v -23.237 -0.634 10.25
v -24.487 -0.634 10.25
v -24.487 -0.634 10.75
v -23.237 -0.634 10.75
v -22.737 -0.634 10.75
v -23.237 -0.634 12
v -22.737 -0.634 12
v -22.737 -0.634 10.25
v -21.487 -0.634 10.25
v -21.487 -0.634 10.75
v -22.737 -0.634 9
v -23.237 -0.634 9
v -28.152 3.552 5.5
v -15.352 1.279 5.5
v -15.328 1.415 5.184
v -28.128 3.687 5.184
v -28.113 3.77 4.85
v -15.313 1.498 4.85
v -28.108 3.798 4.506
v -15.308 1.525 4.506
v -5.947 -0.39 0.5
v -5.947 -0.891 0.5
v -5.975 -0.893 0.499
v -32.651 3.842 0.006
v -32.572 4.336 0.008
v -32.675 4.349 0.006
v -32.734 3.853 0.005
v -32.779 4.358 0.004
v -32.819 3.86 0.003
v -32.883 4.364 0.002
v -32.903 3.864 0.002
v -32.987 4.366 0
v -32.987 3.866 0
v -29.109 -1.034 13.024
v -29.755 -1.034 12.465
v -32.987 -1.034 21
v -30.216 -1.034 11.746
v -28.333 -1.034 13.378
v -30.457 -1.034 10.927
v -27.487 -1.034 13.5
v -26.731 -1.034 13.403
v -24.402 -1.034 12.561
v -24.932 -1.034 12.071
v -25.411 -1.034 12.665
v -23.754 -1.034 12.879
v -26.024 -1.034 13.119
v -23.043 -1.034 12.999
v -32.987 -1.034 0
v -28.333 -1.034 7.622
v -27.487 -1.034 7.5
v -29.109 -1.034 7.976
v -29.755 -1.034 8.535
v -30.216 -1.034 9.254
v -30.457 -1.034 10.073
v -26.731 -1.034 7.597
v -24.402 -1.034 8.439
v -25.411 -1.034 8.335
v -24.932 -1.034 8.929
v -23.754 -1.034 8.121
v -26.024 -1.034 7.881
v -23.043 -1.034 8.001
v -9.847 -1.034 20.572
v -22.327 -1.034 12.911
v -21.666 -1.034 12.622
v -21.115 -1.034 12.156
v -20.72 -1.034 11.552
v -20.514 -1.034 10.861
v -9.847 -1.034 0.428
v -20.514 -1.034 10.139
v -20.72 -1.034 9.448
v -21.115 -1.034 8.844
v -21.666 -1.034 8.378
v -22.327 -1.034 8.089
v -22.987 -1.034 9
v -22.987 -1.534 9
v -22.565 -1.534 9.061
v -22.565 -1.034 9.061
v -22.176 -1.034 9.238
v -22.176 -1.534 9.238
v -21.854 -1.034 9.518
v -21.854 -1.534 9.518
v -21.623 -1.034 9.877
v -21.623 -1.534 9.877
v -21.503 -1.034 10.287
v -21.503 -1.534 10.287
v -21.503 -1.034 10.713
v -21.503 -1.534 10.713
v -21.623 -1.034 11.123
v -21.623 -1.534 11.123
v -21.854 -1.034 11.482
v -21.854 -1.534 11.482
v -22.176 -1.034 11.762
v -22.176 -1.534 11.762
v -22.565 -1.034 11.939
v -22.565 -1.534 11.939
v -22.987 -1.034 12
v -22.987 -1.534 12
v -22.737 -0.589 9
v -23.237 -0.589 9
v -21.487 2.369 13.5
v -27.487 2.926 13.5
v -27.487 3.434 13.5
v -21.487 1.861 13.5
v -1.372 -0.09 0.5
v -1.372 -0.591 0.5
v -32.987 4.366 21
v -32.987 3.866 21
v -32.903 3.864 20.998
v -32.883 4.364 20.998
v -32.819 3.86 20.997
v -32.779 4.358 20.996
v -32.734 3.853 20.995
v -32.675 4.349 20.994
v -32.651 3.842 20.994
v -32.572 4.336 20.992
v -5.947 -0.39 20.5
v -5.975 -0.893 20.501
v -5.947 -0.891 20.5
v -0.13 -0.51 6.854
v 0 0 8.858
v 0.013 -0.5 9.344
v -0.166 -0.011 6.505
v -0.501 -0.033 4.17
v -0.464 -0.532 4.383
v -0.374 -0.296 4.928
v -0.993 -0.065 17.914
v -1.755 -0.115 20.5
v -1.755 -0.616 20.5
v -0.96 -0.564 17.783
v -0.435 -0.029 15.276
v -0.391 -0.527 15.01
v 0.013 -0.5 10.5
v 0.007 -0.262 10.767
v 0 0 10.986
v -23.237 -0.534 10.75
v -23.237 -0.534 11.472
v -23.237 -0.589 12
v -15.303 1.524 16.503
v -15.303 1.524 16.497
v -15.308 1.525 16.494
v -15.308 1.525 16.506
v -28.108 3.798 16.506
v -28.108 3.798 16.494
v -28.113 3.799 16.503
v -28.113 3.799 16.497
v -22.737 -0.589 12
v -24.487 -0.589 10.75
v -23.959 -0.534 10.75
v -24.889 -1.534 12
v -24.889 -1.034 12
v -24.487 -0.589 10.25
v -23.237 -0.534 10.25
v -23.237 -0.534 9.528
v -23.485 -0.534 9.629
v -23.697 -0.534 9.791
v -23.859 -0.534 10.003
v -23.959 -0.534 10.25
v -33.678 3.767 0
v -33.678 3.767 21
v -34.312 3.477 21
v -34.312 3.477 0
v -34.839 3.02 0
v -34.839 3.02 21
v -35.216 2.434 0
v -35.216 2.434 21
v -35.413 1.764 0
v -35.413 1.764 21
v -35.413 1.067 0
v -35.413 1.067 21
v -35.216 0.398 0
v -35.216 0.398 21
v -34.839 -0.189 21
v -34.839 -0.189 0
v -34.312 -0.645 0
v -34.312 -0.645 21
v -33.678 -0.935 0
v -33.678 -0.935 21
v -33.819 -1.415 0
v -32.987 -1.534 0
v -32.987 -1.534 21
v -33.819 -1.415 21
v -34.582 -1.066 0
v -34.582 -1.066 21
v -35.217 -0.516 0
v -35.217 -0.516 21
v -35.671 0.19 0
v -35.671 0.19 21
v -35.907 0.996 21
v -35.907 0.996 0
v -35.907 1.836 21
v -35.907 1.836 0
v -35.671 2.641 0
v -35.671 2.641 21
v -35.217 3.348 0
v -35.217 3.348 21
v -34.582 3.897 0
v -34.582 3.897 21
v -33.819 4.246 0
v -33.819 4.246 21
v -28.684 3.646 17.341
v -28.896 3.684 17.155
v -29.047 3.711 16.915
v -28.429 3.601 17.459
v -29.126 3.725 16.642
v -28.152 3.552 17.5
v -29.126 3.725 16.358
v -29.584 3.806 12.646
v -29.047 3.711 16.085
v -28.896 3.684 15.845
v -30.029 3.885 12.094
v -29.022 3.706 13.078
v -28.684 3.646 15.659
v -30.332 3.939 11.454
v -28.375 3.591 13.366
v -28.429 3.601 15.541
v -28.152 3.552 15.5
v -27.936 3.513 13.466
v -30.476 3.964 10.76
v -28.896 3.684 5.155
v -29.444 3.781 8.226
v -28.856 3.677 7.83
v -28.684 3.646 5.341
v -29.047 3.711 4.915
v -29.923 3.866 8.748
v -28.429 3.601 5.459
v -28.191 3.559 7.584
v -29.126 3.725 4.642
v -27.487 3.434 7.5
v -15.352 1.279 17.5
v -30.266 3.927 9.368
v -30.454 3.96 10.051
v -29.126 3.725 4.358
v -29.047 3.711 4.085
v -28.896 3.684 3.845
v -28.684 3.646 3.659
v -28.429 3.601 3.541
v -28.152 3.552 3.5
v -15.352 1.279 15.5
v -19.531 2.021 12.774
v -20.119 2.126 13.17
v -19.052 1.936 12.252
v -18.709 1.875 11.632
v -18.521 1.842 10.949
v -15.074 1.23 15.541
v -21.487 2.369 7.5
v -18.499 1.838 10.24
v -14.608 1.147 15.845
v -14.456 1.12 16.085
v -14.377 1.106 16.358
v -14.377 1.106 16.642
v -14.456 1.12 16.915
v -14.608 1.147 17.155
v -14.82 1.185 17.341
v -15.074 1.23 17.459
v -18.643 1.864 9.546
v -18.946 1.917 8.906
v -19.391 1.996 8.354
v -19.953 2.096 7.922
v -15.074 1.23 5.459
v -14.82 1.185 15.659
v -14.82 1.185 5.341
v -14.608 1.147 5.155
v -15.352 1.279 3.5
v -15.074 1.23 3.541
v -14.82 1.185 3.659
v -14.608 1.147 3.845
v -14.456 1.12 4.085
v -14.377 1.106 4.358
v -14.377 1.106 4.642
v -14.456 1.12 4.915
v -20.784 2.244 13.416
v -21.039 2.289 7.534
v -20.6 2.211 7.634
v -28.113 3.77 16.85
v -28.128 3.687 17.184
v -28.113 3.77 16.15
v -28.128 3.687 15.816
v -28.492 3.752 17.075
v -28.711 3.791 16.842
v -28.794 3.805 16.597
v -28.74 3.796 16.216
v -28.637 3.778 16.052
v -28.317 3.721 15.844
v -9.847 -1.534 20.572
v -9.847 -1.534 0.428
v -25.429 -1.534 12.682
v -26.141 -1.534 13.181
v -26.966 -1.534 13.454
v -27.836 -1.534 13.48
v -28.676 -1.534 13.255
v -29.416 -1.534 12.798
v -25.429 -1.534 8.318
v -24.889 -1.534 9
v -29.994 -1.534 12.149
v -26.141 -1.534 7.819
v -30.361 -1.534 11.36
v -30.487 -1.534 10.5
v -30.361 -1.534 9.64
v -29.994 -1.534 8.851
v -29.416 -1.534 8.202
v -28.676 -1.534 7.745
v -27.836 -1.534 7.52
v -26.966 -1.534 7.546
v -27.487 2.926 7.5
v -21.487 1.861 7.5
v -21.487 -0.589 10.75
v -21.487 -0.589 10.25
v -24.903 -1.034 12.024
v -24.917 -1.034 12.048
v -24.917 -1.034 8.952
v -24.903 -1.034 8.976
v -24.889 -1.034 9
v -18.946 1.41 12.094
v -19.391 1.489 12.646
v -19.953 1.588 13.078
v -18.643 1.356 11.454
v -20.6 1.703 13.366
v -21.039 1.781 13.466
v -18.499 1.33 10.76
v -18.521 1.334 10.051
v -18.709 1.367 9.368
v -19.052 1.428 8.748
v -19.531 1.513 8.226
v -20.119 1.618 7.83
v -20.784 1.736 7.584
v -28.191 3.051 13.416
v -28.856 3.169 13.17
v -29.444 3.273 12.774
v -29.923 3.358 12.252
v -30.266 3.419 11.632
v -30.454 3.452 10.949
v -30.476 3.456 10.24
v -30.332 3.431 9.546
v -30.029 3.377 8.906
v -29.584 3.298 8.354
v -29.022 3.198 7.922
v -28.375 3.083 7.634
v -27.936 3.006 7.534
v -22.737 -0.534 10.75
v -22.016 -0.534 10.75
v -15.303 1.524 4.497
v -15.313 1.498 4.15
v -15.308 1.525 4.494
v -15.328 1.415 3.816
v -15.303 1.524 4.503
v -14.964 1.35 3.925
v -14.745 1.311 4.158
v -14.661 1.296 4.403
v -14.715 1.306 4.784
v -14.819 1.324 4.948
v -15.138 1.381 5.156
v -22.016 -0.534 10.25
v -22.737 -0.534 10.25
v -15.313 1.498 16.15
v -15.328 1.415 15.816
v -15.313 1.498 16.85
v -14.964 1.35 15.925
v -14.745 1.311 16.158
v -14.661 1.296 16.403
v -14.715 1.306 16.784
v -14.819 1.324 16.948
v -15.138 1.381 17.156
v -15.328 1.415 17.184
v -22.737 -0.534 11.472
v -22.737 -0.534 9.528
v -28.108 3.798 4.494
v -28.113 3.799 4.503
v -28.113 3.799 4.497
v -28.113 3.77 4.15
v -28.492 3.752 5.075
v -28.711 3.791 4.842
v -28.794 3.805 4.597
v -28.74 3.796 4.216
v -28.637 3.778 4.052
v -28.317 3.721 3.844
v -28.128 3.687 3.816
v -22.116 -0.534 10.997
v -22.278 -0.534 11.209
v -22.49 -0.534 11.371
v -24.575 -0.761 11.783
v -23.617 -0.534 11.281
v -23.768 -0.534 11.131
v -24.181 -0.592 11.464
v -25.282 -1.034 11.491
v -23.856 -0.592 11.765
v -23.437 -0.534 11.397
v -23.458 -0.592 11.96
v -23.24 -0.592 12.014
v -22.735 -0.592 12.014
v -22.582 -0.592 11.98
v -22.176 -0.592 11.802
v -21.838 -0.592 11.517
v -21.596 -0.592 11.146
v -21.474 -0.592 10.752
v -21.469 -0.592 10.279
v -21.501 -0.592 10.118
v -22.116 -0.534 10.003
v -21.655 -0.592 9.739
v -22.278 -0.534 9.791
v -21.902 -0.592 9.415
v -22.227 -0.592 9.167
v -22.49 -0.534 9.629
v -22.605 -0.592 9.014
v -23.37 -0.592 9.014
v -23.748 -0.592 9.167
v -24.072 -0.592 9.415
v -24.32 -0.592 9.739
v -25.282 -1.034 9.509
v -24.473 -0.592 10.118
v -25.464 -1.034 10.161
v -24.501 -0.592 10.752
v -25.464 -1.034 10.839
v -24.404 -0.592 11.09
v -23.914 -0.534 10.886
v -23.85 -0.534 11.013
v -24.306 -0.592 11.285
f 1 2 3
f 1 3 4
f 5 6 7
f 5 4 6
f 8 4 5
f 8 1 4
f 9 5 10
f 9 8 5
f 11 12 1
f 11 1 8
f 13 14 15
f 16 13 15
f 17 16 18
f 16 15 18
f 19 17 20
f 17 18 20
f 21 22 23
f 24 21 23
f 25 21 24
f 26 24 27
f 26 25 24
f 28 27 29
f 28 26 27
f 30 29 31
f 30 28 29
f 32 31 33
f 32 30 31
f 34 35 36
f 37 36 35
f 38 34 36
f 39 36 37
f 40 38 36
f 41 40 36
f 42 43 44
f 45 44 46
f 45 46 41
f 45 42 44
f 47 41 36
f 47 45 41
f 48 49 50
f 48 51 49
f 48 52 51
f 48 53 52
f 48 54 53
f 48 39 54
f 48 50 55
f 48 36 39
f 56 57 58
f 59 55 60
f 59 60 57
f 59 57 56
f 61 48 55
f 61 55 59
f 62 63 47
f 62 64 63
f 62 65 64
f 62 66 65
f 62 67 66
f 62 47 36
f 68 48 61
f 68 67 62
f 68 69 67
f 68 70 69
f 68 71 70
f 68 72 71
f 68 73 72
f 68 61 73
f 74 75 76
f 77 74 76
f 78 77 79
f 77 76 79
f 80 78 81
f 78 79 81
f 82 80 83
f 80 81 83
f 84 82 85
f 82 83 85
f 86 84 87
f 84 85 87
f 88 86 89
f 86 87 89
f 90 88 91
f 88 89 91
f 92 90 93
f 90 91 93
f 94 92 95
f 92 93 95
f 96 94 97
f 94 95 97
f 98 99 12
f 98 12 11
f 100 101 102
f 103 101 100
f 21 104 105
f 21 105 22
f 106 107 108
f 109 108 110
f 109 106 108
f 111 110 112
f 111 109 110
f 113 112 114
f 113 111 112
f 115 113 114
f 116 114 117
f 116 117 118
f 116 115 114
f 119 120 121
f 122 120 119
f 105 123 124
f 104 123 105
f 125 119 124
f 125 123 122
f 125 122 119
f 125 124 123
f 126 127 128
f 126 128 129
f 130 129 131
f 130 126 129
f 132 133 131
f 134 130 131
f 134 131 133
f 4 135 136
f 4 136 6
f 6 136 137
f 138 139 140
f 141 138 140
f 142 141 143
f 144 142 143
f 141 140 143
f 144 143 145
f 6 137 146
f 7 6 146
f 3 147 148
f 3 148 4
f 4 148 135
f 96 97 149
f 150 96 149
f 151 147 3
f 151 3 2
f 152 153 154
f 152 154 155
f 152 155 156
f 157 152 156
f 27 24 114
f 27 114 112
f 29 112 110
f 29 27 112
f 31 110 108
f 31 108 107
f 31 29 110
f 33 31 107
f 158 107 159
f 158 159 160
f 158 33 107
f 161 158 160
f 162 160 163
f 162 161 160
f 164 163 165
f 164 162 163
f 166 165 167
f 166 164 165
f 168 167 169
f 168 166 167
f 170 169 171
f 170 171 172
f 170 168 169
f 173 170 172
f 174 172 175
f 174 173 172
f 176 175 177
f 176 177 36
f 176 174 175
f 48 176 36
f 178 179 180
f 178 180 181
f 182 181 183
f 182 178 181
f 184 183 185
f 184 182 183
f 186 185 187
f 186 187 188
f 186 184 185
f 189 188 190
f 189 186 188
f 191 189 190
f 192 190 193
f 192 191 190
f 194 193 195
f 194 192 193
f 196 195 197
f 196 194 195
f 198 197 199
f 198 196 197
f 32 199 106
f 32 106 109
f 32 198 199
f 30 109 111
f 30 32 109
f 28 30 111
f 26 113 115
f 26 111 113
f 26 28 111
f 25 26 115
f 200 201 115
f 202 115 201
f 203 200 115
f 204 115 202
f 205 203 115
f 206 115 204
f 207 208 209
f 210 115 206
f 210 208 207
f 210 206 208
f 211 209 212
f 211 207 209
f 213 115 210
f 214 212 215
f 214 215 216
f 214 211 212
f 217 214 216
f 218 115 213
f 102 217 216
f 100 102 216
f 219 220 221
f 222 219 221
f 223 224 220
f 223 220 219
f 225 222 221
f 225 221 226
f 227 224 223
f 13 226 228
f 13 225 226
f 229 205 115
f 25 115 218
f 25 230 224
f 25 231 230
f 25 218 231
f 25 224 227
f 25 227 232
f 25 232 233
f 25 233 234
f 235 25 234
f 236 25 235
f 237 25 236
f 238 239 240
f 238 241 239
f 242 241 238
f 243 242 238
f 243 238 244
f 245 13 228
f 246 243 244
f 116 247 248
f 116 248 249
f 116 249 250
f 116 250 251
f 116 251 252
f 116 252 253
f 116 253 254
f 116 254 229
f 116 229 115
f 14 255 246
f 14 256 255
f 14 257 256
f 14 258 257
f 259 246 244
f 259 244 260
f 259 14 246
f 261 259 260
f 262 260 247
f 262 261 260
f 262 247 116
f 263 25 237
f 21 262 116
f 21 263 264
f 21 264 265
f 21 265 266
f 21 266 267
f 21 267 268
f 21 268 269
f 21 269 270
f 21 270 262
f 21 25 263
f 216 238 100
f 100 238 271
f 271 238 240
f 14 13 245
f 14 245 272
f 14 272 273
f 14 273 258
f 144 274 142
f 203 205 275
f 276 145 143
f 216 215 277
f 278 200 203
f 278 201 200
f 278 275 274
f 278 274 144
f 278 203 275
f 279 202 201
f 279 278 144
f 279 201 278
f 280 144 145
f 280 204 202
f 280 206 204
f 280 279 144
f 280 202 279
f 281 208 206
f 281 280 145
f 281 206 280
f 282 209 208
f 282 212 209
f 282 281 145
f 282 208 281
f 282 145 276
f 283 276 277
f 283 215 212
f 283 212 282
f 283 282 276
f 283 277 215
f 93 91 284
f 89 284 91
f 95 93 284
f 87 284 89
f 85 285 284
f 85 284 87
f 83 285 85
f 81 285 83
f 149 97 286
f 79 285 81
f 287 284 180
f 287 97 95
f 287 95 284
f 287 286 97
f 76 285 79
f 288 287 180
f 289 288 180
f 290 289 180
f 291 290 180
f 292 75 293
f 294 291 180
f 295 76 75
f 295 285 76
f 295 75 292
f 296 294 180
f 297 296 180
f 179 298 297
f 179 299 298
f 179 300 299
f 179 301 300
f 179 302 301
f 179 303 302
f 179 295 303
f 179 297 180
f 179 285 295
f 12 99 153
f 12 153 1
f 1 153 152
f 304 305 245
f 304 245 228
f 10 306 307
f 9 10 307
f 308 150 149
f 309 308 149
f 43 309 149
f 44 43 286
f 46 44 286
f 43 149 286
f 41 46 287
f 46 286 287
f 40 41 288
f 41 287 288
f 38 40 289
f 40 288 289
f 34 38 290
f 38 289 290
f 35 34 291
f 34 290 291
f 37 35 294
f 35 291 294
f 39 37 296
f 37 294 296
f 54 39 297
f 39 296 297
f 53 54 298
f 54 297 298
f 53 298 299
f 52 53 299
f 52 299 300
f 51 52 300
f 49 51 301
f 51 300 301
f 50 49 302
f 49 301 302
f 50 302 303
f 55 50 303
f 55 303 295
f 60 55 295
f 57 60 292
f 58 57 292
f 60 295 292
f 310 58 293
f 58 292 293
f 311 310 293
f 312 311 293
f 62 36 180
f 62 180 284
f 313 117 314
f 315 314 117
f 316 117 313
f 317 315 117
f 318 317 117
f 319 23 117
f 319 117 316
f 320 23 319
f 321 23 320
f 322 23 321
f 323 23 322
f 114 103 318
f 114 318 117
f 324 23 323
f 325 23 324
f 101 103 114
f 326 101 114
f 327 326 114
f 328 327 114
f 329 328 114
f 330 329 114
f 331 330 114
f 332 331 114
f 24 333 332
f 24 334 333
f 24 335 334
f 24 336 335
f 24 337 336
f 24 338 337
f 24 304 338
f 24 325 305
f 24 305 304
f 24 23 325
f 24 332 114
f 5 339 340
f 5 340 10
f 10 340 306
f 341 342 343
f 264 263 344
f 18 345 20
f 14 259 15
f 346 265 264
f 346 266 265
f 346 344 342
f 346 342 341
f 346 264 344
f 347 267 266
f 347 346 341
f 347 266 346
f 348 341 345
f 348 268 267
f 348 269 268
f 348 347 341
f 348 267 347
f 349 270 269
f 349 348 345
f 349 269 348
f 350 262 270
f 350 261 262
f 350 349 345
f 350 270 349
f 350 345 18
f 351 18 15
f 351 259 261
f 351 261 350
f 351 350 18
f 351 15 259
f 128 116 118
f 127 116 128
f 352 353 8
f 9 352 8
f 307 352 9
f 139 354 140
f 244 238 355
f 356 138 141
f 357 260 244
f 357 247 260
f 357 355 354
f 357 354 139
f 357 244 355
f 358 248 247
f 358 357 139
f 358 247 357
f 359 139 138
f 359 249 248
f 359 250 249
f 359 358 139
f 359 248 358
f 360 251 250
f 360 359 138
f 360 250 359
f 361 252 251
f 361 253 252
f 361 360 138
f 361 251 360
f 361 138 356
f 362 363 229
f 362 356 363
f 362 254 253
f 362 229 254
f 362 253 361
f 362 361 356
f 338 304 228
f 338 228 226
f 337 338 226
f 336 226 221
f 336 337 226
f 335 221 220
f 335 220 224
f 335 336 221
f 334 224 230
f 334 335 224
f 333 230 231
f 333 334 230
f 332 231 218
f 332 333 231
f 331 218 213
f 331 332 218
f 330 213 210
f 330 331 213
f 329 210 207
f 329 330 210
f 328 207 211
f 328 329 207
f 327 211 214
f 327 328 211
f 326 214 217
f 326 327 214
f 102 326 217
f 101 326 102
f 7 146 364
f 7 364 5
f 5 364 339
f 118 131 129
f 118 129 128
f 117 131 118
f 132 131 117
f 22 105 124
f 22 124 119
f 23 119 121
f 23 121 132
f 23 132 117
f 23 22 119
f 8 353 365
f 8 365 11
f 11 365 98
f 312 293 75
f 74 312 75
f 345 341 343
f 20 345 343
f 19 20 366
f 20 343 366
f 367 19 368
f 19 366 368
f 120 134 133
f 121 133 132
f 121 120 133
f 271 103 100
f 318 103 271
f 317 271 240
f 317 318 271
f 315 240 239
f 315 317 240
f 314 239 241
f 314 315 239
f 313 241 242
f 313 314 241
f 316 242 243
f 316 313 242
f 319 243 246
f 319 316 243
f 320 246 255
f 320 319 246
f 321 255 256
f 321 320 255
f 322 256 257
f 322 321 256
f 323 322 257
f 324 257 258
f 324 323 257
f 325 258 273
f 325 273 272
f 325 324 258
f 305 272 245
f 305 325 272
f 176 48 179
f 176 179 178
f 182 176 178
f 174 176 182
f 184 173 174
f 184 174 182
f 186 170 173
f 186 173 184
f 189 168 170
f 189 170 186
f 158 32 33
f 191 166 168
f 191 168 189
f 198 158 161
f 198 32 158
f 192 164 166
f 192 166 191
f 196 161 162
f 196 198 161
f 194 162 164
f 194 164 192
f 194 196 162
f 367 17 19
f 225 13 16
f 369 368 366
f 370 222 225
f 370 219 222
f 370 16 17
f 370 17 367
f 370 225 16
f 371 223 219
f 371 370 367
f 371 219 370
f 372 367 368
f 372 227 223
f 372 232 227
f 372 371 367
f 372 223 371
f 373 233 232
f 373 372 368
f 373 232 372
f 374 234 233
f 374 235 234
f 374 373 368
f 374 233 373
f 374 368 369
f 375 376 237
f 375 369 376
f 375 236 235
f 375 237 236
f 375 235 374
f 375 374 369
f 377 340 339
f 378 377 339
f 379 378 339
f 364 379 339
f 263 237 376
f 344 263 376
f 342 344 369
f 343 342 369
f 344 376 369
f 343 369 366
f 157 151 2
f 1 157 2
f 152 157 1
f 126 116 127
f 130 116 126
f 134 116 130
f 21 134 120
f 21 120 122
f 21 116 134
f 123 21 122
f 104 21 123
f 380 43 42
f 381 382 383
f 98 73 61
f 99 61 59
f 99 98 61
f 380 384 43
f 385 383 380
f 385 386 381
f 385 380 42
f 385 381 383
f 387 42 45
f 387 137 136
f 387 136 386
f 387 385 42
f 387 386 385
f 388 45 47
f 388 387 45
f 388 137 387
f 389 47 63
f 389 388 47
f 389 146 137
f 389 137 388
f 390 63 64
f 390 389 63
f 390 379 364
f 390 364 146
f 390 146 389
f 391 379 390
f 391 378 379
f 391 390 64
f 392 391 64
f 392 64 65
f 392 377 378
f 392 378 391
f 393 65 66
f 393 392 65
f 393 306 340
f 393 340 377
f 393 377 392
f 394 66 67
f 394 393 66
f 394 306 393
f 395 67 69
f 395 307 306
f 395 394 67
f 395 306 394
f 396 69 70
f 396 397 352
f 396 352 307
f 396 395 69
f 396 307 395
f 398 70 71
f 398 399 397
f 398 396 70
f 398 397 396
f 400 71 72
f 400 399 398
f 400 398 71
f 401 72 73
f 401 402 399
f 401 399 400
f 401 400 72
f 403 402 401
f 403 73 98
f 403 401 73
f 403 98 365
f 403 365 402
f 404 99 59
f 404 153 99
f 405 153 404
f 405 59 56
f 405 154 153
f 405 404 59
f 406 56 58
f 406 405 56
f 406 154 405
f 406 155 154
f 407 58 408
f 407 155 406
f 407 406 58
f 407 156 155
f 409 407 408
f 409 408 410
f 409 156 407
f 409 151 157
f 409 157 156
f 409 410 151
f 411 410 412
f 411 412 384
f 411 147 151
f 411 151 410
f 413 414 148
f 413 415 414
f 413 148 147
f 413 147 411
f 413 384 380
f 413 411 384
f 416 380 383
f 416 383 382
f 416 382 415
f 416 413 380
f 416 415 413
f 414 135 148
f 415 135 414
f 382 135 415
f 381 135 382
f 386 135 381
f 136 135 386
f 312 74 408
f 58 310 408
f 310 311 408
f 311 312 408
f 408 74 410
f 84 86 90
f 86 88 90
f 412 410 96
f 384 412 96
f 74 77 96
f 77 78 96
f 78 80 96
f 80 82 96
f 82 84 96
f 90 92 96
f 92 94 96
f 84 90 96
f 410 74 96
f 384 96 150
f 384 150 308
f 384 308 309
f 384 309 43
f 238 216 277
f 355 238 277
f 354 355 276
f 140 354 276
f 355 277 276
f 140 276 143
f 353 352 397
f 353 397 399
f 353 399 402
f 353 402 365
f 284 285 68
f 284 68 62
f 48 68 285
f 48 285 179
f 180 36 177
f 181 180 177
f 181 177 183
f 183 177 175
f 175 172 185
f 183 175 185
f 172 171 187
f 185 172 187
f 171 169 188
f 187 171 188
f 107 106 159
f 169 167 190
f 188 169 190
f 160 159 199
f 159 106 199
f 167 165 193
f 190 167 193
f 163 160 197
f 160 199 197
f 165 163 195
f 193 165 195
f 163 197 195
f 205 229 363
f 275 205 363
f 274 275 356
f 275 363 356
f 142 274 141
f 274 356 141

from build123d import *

# Parameters (mm, degrees)
BOSS_EXTRUDE1_DEPTH = 21
CUT_EXTRUDE1_START  = -5.9
CUT_EXTRUDE1_DEPTH  = 5.9
SKETCH3_W           = 10
SKETCH3_H           = 23.477945608
CUT_EXTRUDE2_DEPTH  = 0.5
CUT_EXTRUDE3_DEPTH  = 0.5
CUT_EXTRUDE4_DEPTH  = 11.5
BOSS_EXTRUDE2_DEPTH = 0.25
FILLET1_R           = 2.1
SKETCH7_R           = 2.5
BOSS_EXTRUDE3_DEPTH = 0.5
SKETCH8_W           = 0.5
SKETCH8_H           = 1.25
SKETCH8_H_2         = 0.5
SKETCH8_W_2         = 1.25
CUT_EXTRUDE5_DEPTH  = 0.1
FILLET2_R           = 2.49


# Read off the part's stored shape, not the designer's step: Cut-Extrude1
with BuildPart() as part:
    # Sketch1 → Boss-Extrude1 (new body)
    with BuildSketch(Plane.XY):
        with BuildLine():
            Line((0.012557203, -0.500251932), (-5.974554862, -0.89330298))
            Line((-5.974554862, -0.89330298), (-32.650528742, 3.842496807))
            ThreePointArc((-32.650528742, 3.842496807), (-35.431616847, 1.584631463), (-32.987442797, -1.0342271))
            Line((-32.987442797, -1.0342271), (0.012557203, -1.0342271))
            Line((0.012557203, -1.0342271), (0.012557203, -1.5342271))
            Line((0.012557203, -1.5342271), (-32.987442797, -1.5342271))
            ThreePointArc((-32.987442797, -1.5342271), (-35.930083434, 1.624018145), (-32.571991326, 4.336372166))
            Line((-32.571991326, 4.336372166), (-5.946831197, -0.390406628))
            Line((-5.946831197, -0.390406628), (0, 0))
            Line((0, 0), (0.012557203, -0.500251932))
        make_face()
    extrude(amount=BOSS_EXTRUDE1_DEPTH)

    # Cut-Extrude1 outline → Cut-Extrude1 (cut)
    with BuildSketch(Plane.XZ.offset(1.5342271).offset(CUT_EXTRUDE1_START)):
        with BuildLine():
            Line((0.012557203, 0), (0.012557203, 9.343939236))
            add(Edge.make_bspline(
                [(0.012557203, 9.343939236), (-0.067700916, 4.933400966), (-1.372327976, 0.5)],
                knots=[0.559253537, 0.559253537, 0.559253537, 1, 1, 1], degree=2))
            Line((-1.372327976, 0.5), (-5.946831197, 0.5))
            Line((-5.946831197, 0.5), (-32.987442797, 0))
            Line((-32.987442797, 0), (0.012557203, 0))
        make_face()
        with BuildLine():
            add(Edge.make_bspline(
                [(-1.755064488, 20.5), (-0.078758631, 15.514798295), (0.012557203, 10.5)],
                knots=[0, 0, 0, 0.501471147, 0.501471147, 0.501471147], degree=2))
            Line((0.012557203, 10.5), (0.012557203, 21))
            Line((0.012557203, 21), (-32.987442797, 21))
            Line((-32.987442797, 21), (-5.946831197, 20.5))
            Line((-5.946831197, 20.5), (-1.755064488, 20.5))
        make_face()
    extrude(amount=CUT_EXTRUDE1_DEPTH, mode=Mode.SUBTRACT)

    # Sketch3 → Cut-Extrude2 (cut)
    with BuildSketch(Plane.XZ.offset(1.5342271)):
        with Locations((-4.846794028, 9.392909882)):
            Rectangle(SKETCH3_W, SKETCH3_H)
    extrude(amount=-CUT_EXTRUDE2_DEPTH, mode=Mode.SUBTRACT)

    # Sketch4 → Cut-Extrude3 (cut)
    with BuildSketch(Plane.XZ.offset(1.5342271)):
        with BuildLine():
            Line((-22.987442797, 12), (-24.889366586, 12))
            ThreePointArc((-24.889366586, 12), (-30.487442797, 10.5), (-24.889366586, 9))
            Line((-24.889366586, 9), (-22.987442797, 9))
            ThreePointArc((-22.987442797, 9), (-21.487442797, 10.5), (-22.987442797, 12))
        make_face()
    extrude(amount=-CUT_EXTRUDE3_DEPTH, mode=Mode.SUBTRACT)

    # Sketch5 → Cut-Extrude4 (cut)
    with BuildSketch(Plane(origin=(0, -1.0342271, 0), x_dir=(1, 0, 0), z_dir=(0, 1, 0))):
        with BuildLine():
            Line((-27.487442797, -13.5), (-21.487442797, -13.5))
            ThreePointArc((-21.487442797, -13.5), (-18.487442797, -10.5), (-21.487442797, -7.5))
            Line((-21.487442797, -7.5), (-27.487442797, -7.5))
            ThreePointArc((-27.487442797, -7.5), (-30.487442797, -10.5), (-27.487442797, -13.5))
        make_face()
    extrude(amount=CUT_EXTRUDE4_DEPTH, mode=Mode.SUBTRACT)

    # Sketch6 → Boss-Extrude2 (add)
    with BuildSketch(Plane(origin=(-0.248891567, -1.401964872, 0), x_dir=(0.9846044320073983, -0.1747973468659884, 0), z_dir=(0.17479734686598838, 0.9846044320073982, 0))):
        with BuildLine():
            Line((-28.339083857, -3.5), (-15.339083857, -3.5))
            ThreePointArc((-15.339083857, -3.5), (-14.339083857, -4.5), (-15.339083857, -5.5))
            Line((-15.339083857, -5.5), (-28.339083857, -5.5))
            ThreePointArc((-28.339083857, -5.5), (-29.339083857, -4.5), (-28.339083857, -3.5))
        make_face()
        with BuildLine():
            Line((-28.339083857, -15.5), (-15.339083857, -15.5))
            ThreePointArc((-15.339083857, -15.5), (-14.339083857, -16.5), (-15.339083857, -17.5))
            Line((-15.339083857, -17.5), (-28.339083857, -17.5))
            ThreePointArc((-28.339083857, -17.5), (-29.339083857, -16.5), (-28.339083857, -15.5))
        make_face()
    extrude(amount=BOSS_EXTRUDE2_DEPTH)

    # Fillet1
    # the kernel refuses this fillet: 2.1 mm, written as the material it takes off along each edge
    with BuildSketch(Plane(origin=(-28.107979795, 3.797782907, 3.5), x_dir=(-0.1747973468659884, -0.9846044320073982, 0), z_dir=(0.9846044320073983, -0.1747973468659884, 0)), Plane(origin=(-15.308122178, 1.525417398, 5.5), x_dir=(-0.17479734686598844, -0.9846044320073983, 0), z_dir=(-0.9846044320073983, 0.1747973468659884, 0)), Plane(origin=(-28.107979795, 3.797782907, 15.5), x_dir=(-0.1747973468659884, -0.9846044320073983, 0), z_dir=(0.9846044320073983, -0.1747973468659884, 0)), Plane(origin=(-15.308122178, 1.525417398, 17.5), x_dir=(-0.17479734686598838, -0.9846044320073983, 0), z_dir=(-0.9846044320073983, 0.1747973468659884, 0))) as fillet1_piece_1:
        with BuildLine():
            CenterArc((2.1, -0.993730346), FILLET1_R, 151.757462816, 28.242537184)
            Line((0, -0.993730346), (-0.042, -0.993730346))
            Line((-0.042, -0.993730346), (-0.042, 0))
            Line((-0.042, 0), (0, 0.042))
            ThreePointArc((0, 0.042), (0.125, 0.042), (0.213, 0.019874607))
            Line((0.213, 0.019874607), (0.25, 0))
        make_face()
    extrude(amount=13, mode=Mode.SUBTRACT)
    with BuildSketch(Plane(origin=(-15.308122178, 1.525417398, 16.5), x_dir=(0, 0, -1), z_dir=(-0.9846044320073983, 0.1747973468659884, 0))) as fillet1_piece_2:
        with BuildLine():
            CenterArc((0.006269654, 2.1), FILLET1_R, 270, 28.242537184)
            Line((0.006269654, 0), (0.006269654, -0.042))
            Line((0.006269654, -0.042), (1, -0.042))
            Line((1, -0.042), (1.042, 0))
            ThreePointArc((1.042, 0), (1.042, 0.125), (1.019874607, 0.213))
            Line((1.019874607, 0.213), (1, 0.25))
        make_face()
    revolve(axis=Axis((-15.308122178, 1.525417398, 16.5), (-0.1747973468659884, -0.9846044320073983, 0)), revolution_arc=180, mode=Mode.SUBTRACT)
    with BuildSketch(Plane(origin=(-28.107979795, 3.797782907, 16.5), x_dir=(0, 0, 1), z_dir=(0.9846044320073983, -0.1747973468659884, 0))) as fillet1_piece_3:
        with BuildLine():
            CenterArc((0.006269654, 2.1), FILLET1_R, 270, 28.242537184)
            Line((0.006269654, 0), (0.006269654, -0.042))
            Line((0.006269654, -0.042), (1, -0.042))
            Line((1, -0.042), (1.042, 0))
            ThreePointArc((1.042, 0), (1.042, 0.125), (1.019874607, 0.213))
            Line((1.019874607, 0.213), (1, 0.25))
        make_face()
    revolve(axis=Axis((-28.107979795, 3.797782907, 16.5), (-0.1747973468659884, -0.9846044320073983, 0)), revolution_arc=180, mode=Mode.SUBTRACT)
    with BuildSketch(Plane(origin=(-15.308122178, 1.525417398, 4.5), x_dir=(0, 0, -1), z_dir=(-0.9846044320073983, 0.1747973468659884, 0))) as fillet1_piece_4:
        with BuildLine():
            CenterArc((0.006269654, 2.1), FILLET1_R, 270, 28.242537184)
            Line((0.006269654, 0), (0.006269654, -0.042))
            Line((0.006269654, -0.042), (1, -0.042))
            Line((1, -0.042), (1.042, 0))
            ThreePointArc((1.042, 0), (1.042, 0.125), (1.019874607, 0.213))
            Line((1.019874607, 0.213), (1, 0.25))
        make_face()
    revolve(axis=Axis((-15.308122178, 1.525417398, 4.5), (-0.1747973468659884, -0.9846044320073983, 0)), revolution_arc=180, mode=Mode.SUBTRACT)
    with BuildSketch(Plane(origin=(-28.107979795, 3.797782907, 4.5), x_dir=(0, 0, 1), z_dir=(0.9846044320073983, -0.1747973468659884, 0))) as fillet1_piece_5:
        with BuildLine():
            CenterArc((0.006269654, 2.1), FILLET1_R, 270, 28.242537184)
            Line((0.006269654, 0), (0.006269654, -0.042))
            Line((0.006269654, -0.042), (1, -0.042))
            Line((1, -0.042), (1.042, 0))
            ThreePointArc((1.042, 0), (1.042, 0.125), (1.019874607, 0.213))
            Line((1.019874607, 0.213), (1, 0.25))
        make_face()
    revolve(axis=Axis((-28.107979795, 3.797782907, 4.5), (-0.1747973468659884, -0.9846044320073983, 0)), revolution_arc=180, mode=Mode.SUBTRACT)

    # Sketch7 → Boss-Extrude3 (add)
    with BuildSketch(Plane(origin=(0, -1.0342271, 0), x_dir=(1, 0, 0), z_dir=(0, 1, 0))):
        with Locations(Location((-22.987442797, -10.5, 0), (0, 0, 218.942441269))):
            Circle(SKETCH7_R)
    extrude(amount=BOSS_EXTRUDE3_DEPTH)

    # Sketch8 → Cut-Extrude5 (cut)
    with BuildSketch(Plane(origin=(0, -0.5342271, 0), x_dir=(1, 0, 0), z_dir=(0, 1, 0))):
        with Locations((-22.987442797, -11.375)):
            Rectangle(SKETCH8_W, SKETCH8_H)
        with Locations((-22.987442797, -10.5)):
            Rectangle(SKETCH8_W, SKETCH8_H_2)
        with Locations((-22.987442797, -9.625)):
            Rectangle(SKETCH8_W, SKETCH8_H)
        with Locations((-23.862442797, -10.5)):
            Rectangle(SKETCH8_W_2, SKETCH8_H_2)
        with Locations((-22.112442797, -10.5)):
            Rectangle(SKETCH8_W_2, SKETCH8_H_2)
    extrude(amount=-CUT_EXTRUDE5_DEPTH, mode=Mode.SUBTRACT)

    # Fillet2
    # the kernel refuses this fillet: 2.49 mm, written as the material it takes off along each edge
    with BuildSketch(Plane(origin=(-22.987442797, -0.5342271, 10.5), x_dir=(-0.777777777777574, 0, 0.6285393610549612), z_dir=(-0.6285393610549612, 0, -0.777777777777574))) as fillet2_piece_1:
        with BuildLine():
            CenterArc((1.003337045, -2.49), FILLET2_R, 53.053469485, 36.946530515)
            Line((1.003337045, 0), (1.003337045, 0.0498))
            Line((1.003337045, 0.0498), (2.5, 0.0498))
            Line((2.5, 0.0498), (2.5498, 0))
            ThreePointArc((2.5498, 0), (2.5498, -0.25), (2.529933259, -0.4602))
            Line((2.529933259, -0.4602), (2.5, -0.5))
        make_face()
    revolve(axis=Axis((-22.987442797, -0.5342271, 10.5), (0, 1, 0)), mode=Mode.SUBTRACT)


solid = part.part
